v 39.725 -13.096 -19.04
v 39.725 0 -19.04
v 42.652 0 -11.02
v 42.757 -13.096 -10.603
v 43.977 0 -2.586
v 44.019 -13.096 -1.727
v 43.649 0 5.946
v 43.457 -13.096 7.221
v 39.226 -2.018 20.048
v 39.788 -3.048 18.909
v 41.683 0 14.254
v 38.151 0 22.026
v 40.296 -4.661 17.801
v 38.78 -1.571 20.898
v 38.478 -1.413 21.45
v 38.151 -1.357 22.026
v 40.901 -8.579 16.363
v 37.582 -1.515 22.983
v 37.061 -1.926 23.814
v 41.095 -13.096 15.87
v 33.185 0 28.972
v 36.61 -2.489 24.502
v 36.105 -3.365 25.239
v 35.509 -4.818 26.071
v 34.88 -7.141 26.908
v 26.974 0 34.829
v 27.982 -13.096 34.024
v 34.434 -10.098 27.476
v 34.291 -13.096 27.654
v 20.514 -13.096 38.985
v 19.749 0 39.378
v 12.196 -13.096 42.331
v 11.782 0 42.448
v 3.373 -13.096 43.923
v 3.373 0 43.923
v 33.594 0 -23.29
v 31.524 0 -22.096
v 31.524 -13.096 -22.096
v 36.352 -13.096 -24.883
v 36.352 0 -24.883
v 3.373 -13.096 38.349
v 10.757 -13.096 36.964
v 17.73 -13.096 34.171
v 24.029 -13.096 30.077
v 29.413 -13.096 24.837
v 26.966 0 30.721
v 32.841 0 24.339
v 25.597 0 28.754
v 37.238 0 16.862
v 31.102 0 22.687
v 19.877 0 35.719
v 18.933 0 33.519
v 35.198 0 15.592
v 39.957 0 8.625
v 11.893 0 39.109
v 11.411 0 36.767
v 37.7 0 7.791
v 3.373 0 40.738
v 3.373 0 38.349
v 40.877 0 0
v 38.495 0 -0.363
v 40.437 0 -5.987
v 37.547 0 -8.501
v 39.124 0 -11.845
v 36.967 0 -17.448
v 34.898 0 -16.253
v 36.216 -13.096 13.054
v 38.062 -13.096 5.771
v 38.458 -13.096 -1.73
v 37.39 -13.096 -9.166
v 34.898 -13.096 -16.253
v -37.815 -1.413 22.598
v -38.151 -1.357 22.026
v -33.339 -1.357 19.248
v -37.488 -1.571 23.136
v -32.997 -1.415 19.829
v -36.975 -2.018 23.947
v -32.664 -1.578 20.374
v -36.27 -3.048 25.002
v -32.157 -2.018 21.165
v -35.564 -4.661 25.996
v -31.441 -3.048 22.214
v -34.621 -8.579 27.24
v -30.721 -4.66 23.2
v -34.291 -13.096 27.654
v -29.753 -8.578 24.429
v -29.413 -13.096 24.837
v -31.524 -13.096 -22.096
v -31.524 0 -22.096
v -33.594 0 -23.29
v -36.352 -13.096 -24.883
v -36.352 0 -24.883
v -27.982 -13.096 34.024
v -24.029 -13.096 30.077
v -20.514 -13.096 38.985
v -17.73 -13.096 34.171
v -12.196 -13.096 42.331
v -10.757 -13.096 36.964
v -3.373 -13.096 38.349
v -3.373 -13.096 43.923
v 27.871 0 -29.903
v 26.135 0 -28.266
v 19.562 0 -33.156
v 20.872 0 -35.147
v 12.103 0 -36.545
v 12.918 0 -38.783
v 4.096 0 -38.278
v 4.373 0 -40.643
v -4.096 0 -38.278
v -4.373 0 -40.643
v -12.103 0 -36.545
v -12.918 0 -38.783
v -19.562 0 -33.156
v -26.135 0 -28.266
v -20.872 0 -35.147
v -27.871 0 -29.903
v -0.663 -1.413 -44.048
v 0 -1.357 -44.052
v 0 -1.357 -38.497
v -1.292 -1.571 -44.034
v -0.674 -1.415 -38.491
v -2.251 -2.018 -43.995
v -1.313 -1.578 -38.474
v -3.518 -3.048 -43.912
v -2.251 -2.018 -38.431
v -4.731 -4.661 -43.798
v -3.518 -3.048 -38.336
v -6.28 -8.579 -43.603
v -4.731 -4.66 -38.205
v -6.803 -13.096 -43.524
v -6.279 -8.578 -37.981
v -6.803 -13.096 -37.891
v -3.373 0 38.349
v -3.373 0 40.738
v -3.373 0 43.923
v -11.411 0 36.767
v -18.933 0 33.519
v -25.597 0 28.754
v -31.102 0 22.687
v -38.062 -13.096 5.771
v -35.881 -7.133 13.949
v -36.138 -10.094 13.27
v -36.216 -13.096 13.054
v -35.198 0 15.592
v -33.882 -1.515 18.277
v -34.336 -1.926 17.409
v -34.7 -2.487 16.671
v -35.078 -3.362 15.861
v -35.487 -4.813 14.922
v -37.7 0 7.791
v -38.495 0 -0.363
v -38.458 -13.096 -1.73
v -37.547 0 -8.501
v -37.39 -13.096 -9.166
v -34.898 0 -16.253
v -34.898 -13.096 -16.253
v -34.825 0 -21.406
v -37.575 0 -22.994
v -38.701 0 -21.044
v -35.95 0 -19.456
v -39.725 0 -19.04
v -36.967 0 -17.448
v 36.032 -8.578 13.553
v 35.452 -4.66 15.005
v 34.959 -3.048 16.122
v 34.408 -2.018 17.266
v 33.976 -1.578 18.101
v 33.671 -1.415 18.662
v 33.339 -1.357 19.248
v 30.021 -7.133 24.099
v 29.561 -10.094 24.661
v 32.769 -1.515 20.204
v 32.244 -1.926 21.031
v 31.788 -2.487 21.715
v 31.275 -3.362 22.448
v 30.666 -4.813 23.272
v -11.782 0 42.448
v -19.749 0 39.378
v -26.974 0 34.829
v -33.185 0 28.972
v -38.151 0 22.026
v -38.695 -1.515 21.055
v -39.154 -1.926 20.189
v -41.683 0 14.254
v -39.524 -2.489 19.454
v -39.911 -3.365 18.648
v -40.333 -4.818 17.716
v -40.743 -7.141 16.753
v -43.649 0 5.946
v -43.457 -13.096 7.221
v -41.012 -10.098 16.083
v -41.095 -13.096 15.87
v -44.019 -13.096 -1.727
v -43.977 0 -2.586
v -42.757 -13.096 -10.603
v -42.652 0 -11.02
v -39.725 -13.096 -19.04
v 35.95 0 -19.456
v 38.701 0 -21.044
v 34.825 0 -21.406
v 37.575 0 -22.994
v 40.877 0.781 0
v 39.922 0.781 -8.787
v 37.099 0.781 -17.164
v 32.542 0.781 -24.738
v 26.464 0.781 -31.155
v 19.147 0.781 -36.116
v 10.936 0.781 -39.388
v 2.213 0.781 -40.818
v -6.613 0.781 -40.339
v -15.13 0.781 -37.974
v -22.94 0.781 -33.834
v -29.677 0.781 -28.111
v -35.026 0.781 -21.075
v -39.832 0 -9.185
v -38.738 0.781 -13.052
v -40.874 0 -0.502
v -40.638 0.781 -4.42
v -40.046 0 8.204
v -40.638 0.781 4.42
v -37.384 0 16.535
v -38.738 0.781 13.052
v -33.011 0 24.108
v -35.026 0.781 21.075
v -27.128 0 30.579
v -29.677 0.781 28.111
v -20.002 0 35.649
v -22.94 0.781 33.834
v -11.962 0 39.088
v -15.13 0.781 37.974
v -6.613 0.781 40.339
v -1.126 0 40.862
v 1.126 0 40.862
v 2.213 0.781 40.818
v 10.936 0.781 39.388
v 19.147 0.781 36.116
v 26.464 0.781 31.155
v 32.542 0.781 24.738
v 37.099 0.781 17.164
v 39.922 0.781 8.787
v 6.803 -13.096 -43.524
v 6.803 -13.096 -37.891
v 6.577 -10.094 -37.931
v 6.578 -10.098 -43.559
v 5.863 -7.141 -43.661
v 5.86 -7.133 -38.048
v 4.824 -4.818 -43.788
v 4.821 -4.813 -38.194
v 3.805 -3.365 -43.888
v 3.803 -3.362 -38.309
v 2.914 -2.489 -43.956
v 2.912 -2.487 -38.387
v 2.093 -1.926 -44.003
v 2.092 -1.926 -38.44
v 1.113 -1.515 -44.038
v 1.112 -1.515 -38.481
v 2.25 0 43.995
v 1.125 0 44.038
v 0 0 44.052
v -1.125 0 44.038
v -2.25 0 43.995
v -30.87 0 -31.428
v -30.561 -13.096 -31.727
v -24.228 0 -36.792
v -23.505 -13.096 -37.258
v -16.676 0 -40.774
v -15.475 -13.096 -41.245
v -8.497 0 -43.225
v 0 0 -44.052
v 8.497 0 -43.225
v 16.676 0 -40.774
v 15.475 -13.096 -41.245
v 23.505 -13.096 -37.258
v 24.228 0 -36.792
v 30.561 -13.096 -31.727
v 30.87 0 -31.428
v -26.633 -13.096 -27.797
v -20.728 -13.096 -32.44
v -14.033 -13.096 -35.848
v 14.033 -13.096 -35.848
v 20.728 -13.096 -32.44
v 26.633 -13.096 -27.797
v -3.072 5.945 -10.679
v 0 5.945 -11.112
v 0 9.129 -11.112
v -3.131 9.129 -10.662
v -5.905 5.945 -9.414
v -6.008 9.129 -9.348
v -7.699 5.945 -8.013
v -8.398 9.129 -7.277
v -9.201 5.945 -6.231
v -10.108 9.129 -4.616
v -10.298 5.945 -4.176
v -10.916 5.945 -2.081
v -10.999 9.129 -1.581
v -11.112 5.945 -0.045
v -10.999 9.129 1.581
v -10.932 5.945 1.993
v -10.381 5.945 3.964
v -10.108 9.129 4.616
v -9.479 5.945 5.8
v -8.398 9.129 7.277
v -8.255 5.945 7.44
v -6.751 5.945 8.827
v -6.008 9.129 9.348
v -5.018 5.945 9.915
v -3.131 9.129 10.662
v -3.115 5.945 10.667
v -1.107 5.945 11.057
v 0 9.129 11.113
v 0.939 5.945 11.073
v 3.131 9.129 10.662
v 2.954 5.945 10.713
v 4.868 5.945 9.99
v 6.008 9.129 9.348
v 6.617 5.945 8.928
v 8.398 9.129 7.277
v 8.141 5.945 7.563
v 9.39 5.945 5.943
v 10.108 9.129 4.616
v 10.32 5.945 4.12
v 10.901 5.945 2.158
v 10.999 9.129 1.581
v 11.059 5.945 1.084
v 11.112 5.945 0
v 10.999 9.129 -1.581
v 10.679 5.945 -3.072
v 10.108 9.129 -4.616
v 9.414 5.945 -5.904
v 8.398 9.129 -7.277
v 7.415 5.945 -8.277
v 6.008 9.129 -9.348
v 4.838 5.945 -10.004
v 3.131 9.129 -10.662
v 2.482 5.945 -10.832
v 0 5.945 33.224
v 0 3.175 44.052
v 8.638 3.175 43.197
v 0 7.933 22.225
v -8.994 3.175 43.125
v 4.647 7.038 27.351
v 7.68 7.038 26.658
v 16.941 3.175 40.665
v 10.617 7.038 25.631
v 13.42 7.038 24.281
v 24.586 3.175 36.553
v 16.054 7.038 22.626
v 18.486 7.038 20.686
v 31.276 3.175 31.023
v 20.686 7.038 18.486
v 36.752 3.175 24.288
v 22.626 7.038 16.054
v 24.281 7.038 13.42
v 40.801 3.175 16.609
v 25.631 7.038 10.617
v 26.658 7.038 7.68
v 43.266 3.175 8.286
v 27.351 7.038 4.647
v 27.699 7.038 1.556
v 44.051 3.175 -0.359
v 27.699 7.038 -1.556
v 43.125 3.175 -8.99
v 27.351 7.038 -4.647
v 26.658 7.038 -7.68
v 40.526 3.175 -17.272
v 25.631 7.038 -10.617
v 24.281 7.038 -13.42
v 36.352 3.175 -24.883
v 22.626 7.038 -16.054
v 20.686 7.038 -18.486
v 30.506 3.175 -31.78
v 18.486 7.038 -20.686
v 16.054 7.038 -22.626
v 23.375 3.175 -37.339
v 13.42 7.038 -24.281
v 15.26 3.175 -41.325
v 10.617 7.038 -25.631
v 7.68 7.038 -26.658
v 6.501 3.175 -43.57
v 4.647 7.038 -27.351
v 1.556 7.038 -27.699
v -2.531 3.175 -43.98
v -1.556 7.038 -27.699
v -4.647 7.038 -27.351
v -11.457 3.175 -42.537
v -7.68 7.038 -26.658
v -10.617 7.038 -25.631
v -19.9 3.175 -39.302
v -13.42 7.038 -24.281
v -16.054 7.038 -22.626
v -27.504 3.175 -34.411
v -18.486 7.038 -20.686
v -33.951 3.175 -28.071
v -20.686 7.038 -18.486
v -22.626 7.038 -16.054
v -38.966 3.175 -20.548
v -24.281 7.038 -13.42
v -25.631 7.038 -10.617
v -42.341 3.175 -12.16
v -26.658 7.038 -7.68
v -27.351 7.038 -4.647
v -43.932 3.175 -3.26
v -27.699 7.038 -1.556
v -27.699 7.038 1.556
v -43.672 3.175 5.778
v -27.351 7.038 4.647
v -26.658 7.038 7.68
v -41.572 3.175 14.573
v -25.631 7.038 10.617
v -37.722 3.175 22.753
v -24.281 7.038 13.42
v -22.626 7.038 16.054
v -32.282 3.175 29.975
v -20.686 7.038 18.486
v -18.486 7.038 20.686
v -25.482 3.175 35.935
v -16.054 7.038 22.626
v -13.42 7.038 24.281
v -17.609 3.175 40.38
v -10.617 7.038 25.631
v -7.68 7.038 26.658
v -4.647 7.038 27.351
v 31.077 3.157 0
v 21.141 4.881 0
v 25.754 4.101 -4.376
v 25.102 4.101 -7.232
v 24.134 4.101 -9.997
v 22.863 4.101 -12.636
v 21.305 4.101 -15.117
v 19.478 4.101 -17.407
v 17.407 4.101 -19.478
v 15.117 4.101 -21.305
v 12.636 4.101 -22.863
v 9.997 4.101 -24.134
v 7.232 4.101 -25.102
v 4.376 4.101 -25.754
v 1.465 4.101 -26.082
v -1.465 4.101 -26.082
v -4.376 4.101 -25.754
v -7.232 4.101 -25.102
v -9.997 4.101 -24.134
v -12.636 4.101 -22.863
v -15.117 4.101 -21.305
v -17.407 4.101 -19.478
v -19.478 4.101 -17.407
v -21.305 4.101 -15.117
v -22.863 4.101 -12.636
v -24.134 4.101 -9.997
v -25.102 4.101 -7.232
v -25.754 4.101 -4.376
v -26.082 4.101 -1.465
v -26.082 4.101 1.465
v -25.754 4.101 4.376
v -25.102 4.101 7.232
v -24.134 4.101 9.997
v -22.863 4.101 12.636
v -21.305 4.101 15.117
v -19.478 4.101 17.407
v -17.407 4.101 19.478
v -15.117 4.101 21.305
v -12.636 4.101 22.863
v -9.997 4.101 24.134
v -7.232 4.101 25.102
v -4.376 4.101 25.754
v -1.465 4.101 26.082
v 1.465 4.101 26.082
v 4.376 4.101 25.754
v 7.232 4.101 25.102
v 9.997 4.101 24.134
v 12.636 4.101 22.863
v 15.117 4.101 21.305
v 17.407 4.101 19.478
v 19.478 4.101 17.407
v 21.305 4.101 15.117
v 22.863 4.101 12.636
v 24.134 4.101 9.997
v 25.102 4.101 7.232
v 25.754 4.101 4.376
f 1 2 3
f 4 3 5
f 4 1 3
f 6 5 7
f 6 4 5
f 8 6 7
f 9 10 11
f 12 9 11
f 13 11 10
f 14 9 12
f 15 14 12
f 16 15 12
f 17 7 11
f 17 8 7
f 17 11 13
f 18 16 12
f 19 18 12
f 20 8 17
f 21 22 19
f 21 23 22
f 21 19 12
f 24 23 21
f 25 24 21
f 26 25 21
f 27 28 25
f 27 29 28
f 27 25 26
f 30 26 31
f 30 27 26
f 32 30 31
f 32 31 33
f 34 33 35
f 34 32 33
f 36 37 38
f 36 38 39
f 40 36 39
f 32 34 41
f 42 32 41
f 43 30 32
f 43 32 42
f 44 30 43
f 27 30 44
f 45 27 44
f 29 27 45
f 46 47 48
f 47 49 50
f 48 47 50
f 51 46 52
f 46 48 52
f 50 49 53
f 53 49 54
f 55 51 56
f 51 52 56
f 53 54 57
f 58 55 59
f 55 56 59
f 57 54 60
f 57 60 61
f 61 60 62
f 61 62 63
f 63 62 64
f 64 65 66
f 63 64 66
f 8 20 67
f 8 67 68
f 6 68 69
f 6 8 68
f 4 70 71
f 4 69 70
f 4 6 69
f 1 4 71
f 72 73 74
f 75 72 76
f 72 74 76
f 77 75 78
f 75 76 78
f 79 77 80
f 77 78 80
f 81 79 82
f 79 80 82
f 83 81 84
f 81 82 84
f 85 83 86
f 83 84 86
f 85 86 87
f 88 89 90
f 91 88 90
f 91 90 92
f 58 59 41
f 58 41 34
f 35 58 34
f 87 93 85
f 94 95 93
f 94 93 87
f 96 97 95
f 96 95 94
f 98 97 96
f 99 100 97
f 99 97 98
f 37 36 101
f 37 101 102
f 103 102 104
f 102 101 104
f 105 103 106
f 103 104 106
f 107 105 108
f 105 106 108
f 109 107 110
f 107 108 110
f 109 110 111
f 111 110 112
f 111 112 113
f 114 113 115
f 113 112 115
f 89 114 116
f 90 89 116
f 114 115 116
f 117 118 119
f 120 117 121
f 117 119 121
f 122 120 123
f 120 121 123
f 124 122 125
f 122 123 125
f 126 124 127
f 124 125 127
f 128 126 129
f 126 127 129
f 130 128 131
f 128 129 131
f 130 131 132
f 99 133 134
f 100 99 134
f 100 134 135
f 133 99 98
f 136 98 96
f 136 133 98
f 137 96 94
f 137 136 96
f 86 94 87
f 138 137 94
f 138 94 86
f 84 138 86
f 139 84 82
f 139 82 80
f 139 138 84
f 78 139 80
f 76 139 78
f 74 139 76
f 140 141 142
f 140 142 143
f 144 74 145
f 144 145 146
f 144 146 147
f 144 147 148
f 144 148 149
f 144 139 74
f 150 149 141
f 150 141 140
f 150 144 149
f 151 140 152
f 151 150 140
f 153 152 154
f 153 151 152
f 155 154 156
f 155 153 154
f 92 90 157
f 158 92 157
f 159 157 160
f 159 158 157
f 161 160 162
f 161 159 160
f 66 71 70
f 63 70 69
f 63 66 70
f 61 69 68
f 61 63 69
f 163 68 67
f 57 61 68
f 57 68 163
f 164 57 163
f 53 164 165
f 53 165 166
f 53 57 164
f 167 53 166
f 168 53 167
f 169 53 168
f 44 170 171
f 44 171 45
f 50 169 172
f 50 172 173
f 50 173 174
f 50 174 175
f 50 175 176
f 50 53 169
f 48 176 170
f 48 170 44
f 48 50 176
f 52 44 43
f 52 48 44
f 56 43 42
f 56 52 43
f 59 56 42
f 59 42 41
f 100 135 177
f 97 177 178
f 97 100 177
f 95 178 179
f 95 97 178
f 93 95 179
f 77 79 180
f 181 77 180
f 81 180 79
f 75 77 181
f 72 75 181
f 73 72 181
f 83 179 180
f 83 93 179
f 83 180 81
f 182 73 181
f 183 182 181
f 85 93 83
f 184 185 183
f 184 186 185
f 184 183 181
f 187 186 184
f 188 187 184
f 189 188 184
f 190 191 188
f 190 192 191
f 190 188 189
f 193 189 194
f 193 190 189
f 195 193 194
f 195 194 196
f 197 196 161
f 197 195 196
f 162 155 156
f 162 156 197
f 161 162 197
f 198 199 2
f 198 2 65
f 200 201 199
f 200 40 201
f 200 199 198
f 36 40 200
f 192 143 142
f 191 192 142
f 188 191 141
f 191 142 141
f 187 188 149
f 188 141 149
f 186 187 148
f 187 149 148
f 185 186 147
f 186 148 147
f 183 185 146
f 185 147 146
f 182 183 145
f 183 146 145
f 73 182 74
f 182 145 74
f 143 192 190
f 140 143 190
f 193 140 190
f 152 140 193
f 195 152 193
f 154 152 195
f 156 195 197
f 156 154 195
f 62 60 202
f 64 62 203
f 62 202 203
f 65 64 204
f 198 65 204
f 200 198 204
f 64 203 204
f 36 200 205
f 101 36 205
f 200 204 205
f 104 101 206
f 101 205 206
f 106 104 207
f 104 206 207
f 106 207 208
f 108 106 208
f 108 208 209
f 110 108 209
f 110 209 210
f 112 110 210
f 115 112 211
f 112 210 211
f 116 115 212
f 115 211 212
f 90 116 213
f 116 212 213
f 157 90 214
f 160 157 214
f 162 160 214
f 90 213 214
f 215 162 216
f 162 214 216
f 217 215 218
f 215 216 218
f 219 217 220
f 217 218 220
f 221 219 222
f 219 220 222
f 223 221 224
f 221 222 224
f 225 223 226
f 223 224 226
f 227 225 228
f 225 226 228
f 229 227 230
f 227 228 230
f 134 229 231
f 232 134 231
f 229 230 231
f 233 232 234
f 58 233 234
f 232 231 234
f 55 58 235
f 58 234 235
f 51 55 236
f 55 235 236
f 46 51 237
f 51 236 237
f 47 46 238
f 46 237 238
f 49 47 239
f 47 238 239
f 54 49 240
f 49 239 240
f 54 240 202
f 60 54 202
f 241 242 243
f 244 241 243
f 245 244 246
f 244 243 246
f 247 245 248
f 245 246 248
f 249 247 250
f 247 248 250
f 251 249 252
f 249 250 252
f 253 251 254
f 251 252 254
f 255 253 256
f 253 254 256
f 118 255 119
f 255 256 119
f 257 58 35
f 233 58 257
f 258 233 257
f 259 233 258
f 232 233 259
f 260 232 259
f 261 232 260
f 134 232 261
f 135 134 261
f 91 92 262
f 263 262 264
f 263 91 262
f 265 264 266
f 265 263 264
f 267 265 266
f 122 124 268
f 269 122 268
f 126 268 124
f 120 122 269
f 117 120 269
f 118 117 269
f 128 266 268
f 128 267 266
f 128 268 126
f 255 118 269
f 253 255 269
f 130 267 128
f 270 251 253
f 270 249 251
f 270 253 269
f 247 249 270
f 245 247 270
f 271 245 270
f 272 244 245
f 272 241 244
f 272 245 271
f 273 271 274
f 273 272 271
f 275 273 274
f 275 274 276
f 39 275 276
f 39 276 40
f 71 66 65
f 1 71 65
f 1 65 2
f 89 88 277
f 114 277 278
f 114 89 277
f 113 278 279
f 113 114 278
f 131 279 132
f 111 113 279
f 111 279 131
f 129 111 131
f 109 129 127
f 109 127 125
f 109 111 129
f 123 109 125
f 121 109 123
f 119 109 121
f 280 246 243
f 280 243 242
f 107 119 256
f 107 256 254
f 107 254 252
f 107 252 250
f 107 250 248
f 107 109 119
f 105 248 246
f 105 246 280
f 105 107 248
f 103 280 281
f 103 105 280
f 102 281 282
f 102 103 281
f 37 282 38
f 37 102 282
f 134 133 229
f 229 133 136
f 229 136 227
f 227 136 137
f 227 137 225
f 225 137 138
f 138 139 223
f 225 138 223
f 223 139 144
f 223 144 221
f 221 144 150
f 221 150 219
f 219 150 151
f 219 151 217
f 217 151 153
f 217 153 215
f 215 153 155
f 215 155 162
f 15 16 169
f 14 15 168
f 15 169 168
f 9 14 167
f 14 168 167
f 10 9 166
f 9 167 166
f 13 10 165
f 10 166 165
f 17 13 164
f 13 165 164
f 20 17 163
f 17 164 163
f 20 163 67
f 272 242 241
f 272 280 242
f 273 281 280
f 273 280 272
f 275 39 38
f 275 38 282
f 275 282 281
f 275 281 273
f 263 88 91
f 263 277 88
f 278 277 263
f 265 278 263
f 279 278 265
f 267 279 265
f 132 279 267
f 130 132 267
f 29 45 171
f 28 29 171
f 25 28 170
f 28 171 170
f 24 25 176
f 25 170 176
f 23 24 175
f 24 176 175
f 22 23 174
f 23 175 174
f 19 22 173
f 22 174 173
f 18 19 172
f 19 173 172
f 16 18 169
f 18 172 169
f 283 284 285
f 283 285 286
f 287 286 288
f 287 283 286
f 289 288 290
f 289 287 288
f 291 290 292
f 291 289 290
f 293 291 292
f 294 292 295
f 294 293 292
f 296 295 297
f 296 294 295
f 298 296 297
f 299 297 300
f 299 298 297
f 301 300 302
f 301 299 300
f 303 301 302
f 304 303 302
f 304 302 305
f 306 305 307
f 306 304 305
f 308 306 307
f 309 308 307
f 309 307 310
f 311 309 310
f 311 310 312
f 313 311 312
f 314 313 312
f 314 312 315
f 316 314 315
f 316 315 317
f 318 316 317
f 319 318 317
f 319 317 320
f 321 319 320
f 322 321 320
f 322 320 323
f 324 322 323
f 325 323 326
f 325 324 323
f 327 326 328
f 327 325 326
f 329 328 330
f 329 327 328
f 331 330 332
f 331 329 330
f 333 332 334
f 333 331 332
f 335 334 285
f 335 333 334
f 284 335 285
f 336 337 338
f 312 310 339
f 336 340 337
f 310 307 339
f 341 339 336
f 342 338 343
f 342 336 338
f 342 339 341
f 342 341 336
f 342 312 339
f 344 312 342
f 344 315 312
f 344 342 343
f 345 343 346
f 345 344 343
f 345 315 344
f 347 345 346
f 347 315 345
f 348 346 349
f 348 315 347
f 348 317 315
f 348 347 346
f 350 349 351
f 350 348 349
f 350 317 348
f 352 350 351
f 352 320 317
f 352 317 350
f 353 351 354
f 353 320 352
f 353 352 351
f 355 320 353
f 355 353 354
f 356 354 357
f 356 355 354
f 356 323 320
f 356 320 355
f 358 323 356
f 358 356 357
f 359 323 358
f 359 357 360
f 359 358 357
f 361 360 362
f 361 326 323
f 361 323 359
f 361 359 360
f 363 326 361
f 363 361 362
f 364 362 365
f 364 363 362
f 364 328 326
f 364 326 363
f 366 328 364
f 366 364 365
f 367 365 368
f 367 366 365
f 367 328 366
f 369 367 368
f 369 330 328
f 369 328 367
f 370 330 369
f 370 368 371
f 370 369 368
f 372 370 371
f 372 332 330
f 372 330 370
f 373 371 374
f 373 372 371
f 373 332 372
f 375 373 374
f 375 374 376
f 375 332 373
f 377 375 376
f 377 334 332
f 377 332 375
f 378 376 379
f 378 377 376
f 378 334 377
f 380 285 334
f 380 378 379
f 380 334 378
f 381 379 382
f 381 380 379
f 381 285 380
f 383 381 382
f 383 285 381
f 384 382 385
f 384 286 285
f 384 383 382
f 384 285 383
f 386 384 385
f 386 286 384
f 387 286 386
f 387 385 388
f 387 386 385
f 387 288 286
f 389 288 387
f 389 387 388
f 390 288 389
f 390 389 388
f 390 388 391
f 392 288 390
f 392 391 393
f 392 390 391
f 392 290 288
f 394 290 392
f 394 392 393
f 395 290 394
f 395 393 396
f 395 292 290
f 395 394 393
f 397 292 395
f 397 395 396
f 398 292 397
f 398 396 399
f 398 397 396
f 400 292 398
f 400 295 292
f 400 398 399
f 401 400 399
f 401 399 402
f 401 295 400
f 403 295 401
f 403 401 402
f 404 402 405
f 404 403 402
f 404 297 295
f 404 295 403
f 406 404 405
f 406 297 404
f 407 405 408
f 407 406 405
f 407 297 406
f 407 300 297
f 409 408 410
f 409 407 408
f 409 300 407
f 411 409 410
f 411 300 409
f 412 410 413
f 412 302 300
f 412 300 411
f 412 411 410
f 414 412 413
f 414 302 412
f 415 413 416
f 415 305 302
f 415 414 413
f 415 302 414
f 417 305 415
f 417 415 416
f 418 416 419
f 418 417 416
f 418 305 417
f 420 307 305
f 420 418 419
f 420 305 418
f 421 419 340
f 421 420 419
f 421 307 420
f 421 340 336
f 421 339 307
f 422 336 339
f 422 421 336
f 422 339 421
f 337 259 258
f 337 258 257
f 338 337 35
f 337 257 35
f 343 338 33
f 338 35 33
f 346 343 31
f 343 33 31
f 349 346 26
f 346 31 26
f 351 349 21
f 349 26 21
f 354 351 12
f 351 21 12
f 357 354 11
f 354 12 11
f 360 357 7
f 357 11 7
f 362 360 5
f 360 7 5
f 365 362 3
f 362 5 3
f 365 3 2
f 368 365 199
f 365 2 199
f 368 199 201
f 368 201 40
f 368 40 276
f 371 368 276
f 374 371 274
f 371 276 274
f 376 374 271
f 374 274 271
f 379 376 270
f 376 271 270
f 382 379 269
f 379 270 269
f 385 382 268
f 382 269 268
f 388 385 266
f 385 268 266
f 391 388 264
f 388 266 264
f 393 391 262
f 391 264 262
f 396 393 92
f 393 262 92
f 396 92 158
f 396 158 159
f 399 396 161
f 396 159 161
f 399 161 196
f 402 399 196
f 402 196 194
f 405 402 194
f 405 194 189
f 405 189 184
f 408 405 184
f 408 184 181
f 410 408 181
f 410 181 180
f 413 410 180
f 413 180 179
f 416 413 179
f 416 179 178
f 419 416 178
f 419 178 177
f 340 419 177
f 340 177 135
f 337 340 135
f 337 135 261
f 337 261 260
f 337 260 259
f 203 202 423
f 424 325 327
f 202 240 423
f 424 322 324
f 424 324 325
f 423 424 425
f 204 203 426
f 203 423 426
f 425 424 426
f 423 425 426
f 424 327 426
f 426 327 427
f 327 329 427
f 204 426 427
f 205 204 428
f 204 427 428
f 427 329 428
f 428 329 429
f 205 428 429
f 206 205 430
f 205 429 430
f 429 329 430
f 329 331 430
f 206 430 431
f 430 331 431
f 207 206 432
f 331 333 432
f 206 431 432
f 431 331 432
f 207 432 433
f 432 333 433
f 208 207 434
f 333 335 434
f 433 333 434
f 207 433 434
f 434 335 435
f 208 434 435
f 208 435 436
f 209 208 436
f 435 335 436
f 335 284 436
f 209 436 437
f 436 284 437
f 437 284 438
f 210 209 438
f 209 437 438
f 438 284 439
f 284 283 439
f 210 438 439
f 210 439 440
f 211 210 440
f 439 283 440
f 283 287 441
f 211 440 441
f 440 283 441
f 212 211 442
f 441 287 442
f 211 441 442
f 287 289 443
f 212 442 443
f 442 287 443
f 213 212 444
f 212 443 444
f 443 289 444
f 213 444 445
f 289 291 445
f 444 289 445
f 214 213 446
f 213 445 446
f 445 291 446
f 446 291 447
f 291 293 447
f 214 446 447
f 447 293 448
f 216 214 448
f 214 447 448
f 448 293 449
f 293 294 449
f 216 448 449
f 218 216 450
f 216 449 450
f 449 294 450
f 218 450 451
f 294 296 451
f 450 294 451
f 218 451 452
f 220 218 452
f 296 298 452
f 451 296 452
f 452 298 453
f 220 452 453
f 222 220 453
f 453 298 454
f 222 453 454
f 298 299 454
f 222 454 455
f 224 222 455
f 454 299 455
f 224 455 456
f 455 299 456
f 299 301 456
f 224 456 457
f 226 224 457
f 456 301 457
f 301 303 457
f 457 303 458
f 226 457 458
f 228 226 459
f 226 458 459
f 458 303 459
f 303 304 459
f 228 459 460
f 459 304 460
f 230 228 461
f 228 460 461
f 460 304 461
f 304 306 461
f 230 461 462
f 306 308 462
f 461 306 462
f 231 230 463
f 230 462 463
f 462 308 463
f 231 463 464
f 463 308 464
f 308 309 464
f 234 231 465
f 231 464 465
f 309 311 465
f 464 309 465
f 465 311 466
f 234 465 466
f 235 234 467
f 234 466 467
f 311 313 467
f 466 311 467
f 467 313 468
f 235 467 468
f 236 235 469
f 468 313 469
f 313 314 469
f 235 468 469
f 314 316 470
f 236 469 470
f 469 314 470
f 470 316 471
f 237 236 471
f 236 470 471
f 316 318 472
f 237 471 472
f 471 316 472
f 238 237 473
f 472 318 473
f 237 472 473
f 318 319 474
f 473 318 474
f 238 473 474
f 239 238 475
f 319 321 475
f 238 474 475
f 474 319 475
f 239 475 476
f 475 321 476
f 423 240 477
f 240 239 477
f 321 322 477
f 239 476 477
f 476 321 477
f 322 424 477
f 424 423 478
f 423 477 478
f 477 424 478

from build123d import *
from build123d.topology import SkipClean

# Parameters (mm, degrees)
SKETCH2_R           = 44.05249
BOSS_EXTRUDE1_DEPTH = 3.175
SKETCH4_R           = 44.45
SKETCH4_R_2         = 38.496875
BOSS_EXTRUDE2_DEPTH = 13.09624
SKETCH5_W           = 6.74624
SKETCH5_H           = 50.081304553
CUT_EXTRUDE1_DEPTH  = 65.211498208
CIRPATTERN1_COUNT   = 3
DOME1_FACE_RADIUS   = 44.05249
DOME1_HEIGHT        = 6.35
SKETCH11_R          = 11.1125
CUT_EXTRUDE4_DEPTH  = 65.211498208
SKETCH12_R          = 44.45
SKETCH12_R_2        = 44.05249
CUT_EXTRUDE5_DEPTH  = 67.674963897
SKETCH13_RX         = 11.739123023
SKETCH13_RY         = 6.803403928
CUT_EXTRUDE6_DEPTH  = 64.661253935
CIRPATTERN2_COUNT   = 3


# Read off the part's stored shape, not the designer's step: Shell2
with BuildPart() as part:
    # Sketch2 → Boss-Extrude1 (new body)
    with BuildSketch(Plane(origin=(0, 0, 0), x_dir=(1, 0, 0), z_dir=(0, 1, 0))):
        with Locations(Location((0, 0, 0), (0, 0, 270))):
            Circle(SKETCH2_R)
    extrude(amount=BOSS_EXTRUDE1_DEPTH)

    # Sketch4 → Boss-Extrude2 (add)
    with BuildSketch(Plane.XZ):
        with Locations(Location((0, 0, 0), (0, 0, 270))):
            Circle(SKETCH4_R)
        with Locations(Location((0, 0, 0), (0, 0, 270))):
            Circle(SKETCH4_R_2, mode=Mode.SUBTRACT)
    extrude(amount=BOSS_EXTRUDE2_DEPTH)

    # Sketch5 → Cut-Extrude1 (cut, through all)
    with BuildSketch(Plane.XZ):
        with Locations((0, 25.040652277)):
            Rectangle(SKETCH5_W, SKETCH5_H)
    cut_extrude1 = extrude(amount=CUT_EXTRUDE1_DEPTH, mode=Mode.SUBTRACT)

    # CirPattern1: Cut-Extrude1 ×3 about axis
    cirpattern1_axis = Axis((0, 0, 0), (0, 1, 0))
    for i in range(1, CIRPATTERN1_COUNT):
        add(cut_extrude1.rotate(cirpattern1_axis, i * 360 / CIRPATTERN1_COUNT), mode=Mode.SUBTRACT)

    # Dome1: a dome of height H over a round flat face of radius A is a cap of a sphere of radius (A * A + H * H) / (2 * H)
    dome1_r = (DOME1_FACE_RADIUS * DOME1_FACE_RADIUS + DOME1_HEIGHT * DOME1_HEIGHT) / (2 * DOME1_HEIGHT)
    dome1_base = Plane((0, 3.175, 0), z_dir=(0, 1, 0))
    with Locations(dome1_base.offset(DOME1_HEIGHT - dome1_r)):
        dome1_ball = Sphere(dome1_r, mode=Mode.PRIVATE)
    add(split(dome1_ball, bisect_by=dome1_base, keep=Keep.TOP, mode=Mode.PRIVATE))

    # Shell2 outline → Shell2 (revolve, cut)
    with BuildSketch(Plane.XY):
        with BuildLine():
            Line((0, 0), (40.87749, 0))
            Line((40.87749, 0), (40.877490147, 0.780856364))
            ThreePointArc((40.877490147, 0.780856364), (20.62755779, 4.951312704), (0, 6.35))
            Line((0, 6.35), (0, 0))
        make_face()
    revolve(axis=Axis((0, 0, 0), (0, 1, 0)), mode=Mode.SUBTRACT)

    # Sketch11 → Cut-Extrude4 (cut, through all)
    with BuildSketch(Plane(origin=(0, 0, 0), x_dir=(1, 0, 0), z_dir=(0, 1, 0))):
        with Locations(Location((0, 0, 0), (0, 0, 90))):
            Circle(SKETCH11_R)
    extrude(amount=CUT_EXTRUDE4_DEPTH, mode=Mode.SUBTRACT)

    # Sketch12 → Cut-Extrude5 (cut, through all)
    with SkipClean():  # the faces are left unmerged after this step: merging them gives an invalid solid
        with BuildSketch(Plane.XZ.offset(13.09624)):
            Circle(SKETCH12_R)
            with Locations(Location((0, 0, 0), (0, 0, 325.608536688))):
                Circle(SKETCH12_R_2, mode=Mode.SUBTRACT)
        extrude(amount=-CUT_EXTRUDE5_DEPTH, mode=Mode.SUBTRACT)

    # Sketch13 → Cut-Extrude6 (cut, through all)
    with SkipClean():  # the faces are left unmerged after this step: merging them gives an invalid solid
        with BuildSketch(Plane.XY):
            with Locations(Location((0, -13.09624), (0, 0, 90))):
                Ellipse(SKETCH13_RX, SKETCH13_RY)
        cut_extrude6 = extrude(amount=-CUT_EXTRUDE6_DEPTH, mode=Mode.SUBTRACT)

    # CirPattern2: Cut-Extrude6 ×3 about axis
    with SkipClean():  # the faces are left unmerged after this step: merging them gives an invalid solid
        cirpattern2_axis = Axis((0, 3.175, 0), (0, -1, 0))
        for i in range(1, CIRPATTERN2_COUNT):
            add(cut_extrude6.rotate(cirpattern2_axis, i * 360 / CIRPATTERN2_COUNT), mode=Mode.SUBTRACT)


solid = part.part
